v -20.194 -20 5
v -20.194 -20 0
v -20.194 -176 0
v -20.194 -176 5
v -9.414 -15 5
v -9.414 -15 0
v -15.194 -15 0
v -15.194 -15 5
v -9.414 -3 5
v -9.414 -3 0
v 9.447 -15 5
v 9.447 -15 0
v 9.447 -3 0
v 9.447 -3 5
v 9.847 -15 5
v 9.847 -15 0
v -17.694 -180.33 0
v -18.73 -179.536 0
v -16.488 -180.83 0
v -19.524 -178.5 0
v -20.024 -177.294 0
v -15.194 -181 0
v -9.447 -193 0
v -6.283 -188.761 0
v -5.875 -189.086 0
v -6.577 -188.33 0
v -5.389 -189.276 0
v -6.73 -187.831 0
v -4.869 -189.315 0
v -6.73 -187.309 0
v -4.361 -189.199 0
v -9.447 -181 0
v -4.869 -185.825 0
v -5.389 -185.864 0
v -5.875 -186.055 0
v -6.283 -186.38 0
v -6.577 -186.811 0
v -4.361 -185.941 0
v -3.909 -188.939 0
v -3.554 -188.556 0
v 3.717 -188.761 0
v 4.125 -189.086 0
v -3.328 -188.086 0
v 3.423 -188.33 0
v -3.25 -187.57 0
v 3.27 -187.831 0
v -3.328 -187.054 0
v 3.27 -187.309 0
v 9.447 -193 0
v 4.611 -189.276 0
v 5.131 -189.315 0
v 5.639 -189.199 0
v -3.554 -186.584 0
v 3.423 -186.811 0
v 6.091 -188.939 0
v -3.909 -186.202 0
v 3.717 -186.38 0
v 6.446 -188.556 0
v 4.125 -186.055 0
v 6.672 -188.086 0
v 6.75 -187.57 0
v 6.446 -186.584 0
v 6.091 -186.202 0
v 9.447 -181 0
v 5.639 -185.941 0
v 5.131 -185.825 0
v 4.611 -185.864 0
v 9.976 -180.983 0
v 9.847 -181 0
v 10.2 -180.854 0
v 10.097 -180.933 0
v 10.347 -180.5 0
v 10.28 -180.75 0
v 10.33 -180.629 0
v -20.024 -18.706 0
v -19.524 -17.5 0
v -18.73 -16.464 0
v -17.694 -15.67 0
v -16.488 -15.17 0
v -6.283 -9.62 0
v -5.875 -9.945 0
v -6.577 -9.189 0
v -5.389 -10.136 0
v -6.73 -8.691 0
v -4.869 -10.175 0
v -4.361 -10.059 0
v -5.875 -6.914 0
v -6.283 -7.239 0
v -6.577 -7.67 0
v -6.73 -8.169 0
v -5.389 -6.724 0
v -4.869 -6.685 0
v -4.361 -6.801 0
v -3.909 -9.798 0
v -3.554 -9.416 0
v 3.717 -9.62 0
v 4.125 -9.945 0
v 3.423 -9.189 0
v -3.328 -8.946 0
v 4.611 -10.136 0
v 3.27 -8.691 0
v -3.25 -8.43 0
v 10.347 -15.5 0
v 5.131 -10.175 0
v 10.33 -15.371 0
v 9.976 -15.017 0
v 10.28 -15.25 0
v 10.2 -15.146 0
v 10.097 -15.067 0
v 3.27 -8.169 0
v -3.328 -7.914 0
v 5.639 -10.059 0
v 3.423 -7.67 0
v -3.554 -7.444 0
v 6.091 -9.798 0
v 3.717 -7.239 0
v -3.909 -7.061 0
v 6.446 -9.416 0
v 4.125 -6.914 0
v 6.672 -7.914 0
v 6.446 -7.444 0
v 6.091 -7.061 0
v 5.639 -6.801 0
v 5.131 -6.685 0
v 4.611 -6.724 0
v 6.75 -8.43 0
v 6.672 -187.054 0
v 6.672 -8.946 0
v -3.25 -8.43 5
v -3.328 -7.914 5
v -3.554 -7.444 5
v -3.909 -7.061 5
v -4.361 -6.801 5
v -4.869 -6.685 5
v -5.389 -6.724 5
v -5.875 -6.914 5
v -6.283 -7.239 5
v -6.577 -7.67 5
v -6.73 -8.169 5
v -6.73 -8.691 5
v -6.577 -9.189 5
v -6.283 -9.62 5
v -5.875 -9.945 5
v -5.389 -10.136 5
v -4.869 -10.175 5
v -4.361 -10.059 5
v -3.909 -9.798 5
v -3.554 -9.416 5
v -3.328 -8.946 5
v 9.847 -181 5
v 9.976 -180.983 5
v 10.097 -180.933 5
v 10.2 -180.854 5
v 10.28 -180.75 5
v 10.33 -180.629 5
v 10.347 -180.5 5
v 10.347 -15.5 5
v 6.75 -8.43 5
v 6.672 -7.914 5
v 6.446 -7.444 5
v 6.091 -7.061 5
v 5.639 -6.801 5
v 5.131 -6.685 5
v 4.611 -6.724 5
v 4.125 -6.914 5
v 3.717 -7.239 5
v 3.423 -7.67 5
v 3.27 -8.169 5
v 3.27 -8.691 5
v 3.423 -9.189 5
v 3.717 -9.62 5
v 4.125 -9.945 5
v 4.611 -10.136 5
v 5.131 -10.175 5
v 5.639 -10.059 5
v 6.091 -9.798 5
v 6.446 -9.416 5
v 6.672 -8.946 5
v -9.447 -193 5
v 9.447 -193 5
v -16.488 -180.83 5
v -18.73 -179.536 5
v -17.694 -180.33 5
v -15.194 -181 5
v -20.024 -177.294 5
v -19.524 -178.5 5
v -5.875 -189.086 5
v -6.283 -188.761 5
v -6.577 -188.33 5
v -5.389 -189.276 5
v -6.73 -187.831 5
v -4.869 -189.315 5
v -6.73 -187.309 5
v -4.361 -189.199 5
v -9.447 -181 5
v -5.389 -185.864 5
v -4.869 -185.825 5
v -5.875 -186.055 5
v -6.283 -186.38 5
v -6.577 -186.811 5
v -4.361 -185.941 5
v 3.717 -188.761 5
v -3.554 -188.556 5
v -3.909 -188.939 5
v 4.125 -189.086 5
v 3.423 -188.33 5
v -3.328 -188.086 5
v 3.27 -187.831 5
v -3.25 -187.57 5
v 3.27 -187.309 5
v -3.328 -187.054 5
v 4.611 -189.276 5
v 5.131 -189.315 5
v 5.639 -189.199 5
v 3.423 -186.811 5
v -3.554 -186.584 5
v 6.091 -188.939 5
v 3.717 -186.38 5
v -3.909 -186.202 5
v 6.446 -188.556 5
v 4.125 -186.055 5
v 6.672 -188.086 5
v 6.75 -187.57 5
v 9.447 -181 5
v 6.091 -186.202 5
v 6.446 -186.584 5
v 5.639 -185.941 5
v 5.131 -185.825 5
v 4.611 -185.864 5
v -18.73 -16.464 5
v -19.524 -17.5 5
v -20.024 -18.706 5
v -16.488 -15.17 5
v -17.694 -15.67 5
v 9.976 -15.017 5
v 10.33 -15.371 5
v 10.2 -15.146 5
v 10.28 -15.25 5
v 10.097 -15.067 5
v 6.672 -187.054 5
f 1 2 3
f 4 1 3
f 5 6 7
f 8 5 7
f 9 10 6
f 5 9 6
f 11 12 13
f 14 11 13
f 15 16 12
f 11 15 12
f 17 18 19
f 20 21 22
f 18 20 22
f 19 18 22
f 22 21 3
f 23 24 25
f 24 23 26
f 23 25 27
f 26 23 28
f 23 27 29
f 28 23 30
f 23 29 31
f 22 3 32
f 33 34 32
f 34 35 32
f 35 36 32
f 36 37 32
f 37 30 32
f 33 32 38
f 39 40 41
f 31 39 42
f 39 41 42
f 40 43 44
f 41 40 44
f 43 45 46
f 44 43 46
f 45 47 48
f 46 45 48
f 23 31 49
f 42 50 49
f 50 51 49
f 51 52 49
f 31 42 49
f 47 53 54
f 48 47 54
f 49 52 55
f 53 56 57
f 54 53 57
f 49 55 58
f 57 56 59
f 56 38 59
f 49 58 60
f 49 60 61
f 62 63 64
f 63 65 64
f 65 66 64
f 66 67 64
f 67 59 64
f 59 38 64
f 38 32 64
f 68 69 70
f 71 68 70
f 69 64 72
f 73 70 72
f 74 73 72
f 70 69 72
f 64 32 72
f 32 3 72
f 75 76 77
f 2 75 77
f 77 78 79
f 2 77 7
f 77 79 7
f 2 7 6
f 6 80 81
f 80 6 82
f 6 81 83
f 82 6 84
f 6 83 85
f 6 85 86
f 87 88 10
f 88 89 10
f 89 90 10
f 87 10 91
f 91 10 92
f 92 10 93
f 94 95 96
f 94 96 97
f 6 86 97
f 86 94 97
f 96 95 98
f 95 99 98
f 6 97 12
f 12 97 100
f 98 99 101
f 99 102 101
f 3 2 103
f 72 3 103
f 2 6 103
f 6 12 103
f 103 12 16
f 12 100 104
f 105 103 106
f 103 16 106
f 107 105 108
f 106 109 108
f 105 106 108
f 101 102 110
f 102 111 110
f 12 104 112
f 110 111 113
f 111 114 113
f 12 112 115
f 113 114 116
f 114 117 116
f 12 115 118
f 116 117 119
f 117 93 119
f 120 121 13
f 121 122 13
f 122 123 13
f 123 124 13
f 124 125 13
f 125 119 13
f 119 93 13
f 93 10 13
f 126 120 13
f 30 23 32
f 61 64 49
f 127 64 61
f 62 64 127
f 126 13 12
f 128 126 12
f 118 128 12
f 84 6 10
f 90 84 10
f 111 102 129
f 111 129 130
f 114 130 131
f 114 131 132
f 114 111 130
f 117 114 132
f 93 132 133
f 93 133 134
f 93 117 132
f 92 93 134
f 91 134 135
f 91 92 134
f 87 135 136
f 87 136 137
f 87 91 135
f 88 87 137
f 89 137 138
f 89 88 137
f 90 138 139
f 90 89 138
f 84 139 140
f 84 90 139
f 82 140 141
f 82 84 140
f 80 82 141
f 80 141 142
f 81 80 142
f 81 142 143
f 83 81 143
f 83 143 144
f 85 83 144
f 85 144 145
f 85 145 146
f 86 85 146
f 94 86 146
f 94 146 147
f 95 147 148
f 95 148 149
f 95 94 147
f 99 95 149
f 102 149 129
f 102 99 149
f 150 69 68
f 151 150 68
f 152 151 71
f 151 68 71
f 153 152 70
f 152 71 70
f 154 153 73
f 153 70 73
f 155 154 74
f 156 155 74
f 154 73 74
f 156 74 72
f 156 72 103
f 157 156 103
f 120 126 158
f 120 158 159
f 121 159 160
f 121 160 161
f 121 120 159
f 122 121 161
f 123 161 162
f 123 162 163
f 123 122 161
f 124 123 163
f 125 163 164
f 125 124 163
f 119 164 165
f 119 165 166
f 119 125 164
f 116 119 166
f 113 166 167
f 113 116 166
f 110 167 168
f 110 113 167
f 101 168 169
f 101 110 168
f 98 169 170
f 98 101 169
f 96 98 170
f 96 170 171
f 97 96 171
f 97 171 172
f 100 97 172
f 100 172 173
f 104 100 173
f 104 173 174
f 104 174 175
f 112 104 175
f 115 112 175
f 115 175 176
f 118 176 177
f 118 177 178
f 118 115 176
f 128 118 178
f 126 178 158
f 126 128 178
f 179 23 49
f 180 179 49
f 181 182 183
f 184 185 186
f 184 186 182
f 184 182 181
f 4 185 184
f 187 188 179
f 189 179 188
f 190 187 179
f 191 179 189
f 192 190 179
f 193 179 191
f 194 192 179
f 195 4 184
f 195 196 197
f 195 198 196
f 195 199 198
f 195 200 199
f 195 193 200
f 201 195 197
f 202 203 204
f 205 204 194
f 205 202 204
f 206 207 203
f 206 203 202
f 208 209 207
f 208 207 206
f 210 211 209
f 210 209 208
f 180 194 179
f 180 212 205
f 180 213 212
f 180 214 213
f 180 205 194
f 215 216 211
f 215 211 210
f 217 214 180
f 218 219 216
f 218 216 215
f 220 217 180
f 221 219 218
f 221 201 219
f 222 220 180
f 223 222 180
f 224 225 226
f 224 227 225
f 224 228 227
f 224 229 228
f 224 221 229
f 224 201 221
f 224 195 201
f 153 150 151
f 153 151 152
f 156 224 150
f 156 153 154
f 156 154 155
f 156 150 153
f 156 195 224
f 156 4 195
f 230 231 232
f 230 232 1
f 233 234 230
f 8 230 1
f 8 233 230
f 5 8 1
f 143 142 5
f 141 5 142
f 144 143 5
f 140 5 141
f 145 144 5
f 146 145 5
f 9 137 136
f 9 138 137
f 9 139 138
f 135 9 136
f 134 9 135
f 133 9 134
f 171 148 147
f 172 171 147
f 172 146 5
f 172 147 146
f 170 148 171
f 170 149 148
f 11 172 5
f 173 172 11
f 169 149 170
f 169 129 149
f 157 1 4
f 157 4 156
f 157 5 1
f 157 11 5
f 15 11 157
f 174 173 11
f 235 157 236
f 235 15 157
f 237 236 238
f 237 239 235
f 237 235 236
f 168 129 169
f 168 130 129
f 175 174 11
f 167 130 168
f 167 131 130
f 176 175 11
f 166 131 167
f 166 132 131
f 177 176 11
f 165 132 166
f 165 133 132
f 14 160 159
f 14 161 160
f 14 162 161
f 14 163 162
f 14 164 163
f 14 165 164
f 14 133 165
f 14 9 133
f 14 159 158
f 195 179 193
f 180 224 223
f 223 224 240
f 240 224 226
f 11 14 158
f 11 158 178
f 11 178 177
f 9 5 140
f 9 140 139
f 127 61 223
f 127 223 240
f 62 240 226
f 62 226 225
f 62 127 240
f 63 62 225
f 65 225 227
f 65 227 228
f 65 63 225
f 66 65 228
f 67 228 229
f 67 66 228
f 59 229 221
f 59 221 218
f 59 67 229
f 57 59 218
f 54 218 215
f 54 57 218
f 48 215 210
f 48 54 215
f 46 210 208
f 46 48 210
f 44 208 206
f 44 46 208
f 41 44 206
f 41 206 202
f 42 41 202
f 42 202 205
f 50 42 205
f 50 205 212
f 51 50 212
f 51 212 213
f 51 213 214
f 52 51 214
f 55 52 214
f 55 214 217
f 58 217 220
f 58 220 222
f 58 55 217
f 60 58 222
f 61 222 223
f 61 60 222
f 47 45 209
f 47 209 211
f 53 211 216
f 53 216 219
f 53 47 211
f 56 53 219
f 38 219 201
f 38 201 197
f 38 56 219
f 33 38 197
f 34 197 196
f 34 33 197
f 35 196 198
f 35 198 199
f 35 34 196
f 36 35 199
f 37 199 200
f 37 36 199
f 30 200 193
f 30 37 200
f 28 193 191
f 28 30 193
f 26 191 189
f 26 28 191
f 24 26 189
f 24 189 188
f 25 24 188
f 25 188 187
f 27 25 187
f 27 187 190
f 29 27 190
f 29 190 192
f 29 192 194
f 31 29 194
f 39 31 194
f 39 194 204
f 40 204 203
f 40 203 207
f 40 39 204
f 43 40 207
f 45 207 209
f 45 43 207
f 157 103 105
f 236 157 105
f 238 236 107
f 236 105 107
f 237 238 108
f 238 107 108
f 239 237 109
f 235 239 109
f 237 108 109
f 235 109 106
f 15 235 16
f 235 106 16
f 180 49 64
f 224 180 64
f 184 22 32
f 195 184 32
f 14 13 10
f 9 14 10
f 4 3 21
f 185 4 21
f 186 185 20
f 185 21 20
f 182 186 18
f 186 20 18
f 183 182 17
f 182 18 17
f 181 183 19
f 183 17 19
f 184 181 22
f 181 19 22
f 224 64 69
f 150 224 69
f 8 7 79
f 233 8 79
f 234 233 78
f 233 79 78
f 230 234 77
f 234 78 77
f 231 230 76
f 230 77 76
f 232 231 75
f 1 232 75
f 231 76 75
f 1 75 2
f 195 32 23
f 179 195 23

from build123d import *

# Parameters (mm, degrees)
SKETCH1_R           = 1.75
BOSS_EXTRUDE1_DEPTH = 5


with BuildPart() as part:
    # Sketch1 → Boss-Extrude1 (new body)
    with BuildSketch(Plane.XY):
        with BuildLine():
            Line((-20.194136312, -20), (-20.194136312, -176))
            ThreePointArc((-20.194136312, -176), (-18.729670218, -179.535533906), (-15.194136312, -181))
            Line((-15.194136312, -181), (-9.446581599, -181))
            Line((-9.446581599, -181), (-9.446581599, -193))
            Line((-9.446581599, -193), (9.446581599, -193))
            Line((9.446581599, -193), (9.446581599, -181))
            Line((9.446581599, -181), (9.846581599, -181))
            ThreePointArc((9.846581599, -181), (10.200134989, -180.853553391), (10.346581599, -180.5))
            Line((10.346581599, -180.5), (10.346581599, -15.5))
            ThreePointArc((10.346581599, -15.5), (10.200134989, -15.146446609), (9.846581599, -15))
            Line((9.846581599, -15), (9.446581599, -15))
            Line((9.446581599, -15), (9.446581599, -3))
            Line((9.446581599, -3), (-9.413759597, -3))
            Line((-9.413759597, -3), (-9.413759597, -15))
            Line((-9.413759597, -15), (-15.194136312, -15))
            ThreePointArc((-15.194136312, -15), (-18.729670218, -16.464466094), (-20.194136312, -20))
        make_face()
        with Locations((-5, -187.570297721)):
            Circle(SKETCH1_R, mode=Mode.SUBTRACT)
        with Locations((5, -187.570297721)):
            Circle(SKETCH1_R, mode=Mode.SUBTRACT)
        with Locations((-5, -8.429702279)):
            Circle(SKETCH1_R, mode=Mode.SUBTRACT)
        with Locations((5, -8.429702279)):
            Circle(SKETCH1_R, mode=Mode.SUBTRACT)
    extrude(amount=BOSS_EXTRUDE1_DEPTH)


solid = part.part
